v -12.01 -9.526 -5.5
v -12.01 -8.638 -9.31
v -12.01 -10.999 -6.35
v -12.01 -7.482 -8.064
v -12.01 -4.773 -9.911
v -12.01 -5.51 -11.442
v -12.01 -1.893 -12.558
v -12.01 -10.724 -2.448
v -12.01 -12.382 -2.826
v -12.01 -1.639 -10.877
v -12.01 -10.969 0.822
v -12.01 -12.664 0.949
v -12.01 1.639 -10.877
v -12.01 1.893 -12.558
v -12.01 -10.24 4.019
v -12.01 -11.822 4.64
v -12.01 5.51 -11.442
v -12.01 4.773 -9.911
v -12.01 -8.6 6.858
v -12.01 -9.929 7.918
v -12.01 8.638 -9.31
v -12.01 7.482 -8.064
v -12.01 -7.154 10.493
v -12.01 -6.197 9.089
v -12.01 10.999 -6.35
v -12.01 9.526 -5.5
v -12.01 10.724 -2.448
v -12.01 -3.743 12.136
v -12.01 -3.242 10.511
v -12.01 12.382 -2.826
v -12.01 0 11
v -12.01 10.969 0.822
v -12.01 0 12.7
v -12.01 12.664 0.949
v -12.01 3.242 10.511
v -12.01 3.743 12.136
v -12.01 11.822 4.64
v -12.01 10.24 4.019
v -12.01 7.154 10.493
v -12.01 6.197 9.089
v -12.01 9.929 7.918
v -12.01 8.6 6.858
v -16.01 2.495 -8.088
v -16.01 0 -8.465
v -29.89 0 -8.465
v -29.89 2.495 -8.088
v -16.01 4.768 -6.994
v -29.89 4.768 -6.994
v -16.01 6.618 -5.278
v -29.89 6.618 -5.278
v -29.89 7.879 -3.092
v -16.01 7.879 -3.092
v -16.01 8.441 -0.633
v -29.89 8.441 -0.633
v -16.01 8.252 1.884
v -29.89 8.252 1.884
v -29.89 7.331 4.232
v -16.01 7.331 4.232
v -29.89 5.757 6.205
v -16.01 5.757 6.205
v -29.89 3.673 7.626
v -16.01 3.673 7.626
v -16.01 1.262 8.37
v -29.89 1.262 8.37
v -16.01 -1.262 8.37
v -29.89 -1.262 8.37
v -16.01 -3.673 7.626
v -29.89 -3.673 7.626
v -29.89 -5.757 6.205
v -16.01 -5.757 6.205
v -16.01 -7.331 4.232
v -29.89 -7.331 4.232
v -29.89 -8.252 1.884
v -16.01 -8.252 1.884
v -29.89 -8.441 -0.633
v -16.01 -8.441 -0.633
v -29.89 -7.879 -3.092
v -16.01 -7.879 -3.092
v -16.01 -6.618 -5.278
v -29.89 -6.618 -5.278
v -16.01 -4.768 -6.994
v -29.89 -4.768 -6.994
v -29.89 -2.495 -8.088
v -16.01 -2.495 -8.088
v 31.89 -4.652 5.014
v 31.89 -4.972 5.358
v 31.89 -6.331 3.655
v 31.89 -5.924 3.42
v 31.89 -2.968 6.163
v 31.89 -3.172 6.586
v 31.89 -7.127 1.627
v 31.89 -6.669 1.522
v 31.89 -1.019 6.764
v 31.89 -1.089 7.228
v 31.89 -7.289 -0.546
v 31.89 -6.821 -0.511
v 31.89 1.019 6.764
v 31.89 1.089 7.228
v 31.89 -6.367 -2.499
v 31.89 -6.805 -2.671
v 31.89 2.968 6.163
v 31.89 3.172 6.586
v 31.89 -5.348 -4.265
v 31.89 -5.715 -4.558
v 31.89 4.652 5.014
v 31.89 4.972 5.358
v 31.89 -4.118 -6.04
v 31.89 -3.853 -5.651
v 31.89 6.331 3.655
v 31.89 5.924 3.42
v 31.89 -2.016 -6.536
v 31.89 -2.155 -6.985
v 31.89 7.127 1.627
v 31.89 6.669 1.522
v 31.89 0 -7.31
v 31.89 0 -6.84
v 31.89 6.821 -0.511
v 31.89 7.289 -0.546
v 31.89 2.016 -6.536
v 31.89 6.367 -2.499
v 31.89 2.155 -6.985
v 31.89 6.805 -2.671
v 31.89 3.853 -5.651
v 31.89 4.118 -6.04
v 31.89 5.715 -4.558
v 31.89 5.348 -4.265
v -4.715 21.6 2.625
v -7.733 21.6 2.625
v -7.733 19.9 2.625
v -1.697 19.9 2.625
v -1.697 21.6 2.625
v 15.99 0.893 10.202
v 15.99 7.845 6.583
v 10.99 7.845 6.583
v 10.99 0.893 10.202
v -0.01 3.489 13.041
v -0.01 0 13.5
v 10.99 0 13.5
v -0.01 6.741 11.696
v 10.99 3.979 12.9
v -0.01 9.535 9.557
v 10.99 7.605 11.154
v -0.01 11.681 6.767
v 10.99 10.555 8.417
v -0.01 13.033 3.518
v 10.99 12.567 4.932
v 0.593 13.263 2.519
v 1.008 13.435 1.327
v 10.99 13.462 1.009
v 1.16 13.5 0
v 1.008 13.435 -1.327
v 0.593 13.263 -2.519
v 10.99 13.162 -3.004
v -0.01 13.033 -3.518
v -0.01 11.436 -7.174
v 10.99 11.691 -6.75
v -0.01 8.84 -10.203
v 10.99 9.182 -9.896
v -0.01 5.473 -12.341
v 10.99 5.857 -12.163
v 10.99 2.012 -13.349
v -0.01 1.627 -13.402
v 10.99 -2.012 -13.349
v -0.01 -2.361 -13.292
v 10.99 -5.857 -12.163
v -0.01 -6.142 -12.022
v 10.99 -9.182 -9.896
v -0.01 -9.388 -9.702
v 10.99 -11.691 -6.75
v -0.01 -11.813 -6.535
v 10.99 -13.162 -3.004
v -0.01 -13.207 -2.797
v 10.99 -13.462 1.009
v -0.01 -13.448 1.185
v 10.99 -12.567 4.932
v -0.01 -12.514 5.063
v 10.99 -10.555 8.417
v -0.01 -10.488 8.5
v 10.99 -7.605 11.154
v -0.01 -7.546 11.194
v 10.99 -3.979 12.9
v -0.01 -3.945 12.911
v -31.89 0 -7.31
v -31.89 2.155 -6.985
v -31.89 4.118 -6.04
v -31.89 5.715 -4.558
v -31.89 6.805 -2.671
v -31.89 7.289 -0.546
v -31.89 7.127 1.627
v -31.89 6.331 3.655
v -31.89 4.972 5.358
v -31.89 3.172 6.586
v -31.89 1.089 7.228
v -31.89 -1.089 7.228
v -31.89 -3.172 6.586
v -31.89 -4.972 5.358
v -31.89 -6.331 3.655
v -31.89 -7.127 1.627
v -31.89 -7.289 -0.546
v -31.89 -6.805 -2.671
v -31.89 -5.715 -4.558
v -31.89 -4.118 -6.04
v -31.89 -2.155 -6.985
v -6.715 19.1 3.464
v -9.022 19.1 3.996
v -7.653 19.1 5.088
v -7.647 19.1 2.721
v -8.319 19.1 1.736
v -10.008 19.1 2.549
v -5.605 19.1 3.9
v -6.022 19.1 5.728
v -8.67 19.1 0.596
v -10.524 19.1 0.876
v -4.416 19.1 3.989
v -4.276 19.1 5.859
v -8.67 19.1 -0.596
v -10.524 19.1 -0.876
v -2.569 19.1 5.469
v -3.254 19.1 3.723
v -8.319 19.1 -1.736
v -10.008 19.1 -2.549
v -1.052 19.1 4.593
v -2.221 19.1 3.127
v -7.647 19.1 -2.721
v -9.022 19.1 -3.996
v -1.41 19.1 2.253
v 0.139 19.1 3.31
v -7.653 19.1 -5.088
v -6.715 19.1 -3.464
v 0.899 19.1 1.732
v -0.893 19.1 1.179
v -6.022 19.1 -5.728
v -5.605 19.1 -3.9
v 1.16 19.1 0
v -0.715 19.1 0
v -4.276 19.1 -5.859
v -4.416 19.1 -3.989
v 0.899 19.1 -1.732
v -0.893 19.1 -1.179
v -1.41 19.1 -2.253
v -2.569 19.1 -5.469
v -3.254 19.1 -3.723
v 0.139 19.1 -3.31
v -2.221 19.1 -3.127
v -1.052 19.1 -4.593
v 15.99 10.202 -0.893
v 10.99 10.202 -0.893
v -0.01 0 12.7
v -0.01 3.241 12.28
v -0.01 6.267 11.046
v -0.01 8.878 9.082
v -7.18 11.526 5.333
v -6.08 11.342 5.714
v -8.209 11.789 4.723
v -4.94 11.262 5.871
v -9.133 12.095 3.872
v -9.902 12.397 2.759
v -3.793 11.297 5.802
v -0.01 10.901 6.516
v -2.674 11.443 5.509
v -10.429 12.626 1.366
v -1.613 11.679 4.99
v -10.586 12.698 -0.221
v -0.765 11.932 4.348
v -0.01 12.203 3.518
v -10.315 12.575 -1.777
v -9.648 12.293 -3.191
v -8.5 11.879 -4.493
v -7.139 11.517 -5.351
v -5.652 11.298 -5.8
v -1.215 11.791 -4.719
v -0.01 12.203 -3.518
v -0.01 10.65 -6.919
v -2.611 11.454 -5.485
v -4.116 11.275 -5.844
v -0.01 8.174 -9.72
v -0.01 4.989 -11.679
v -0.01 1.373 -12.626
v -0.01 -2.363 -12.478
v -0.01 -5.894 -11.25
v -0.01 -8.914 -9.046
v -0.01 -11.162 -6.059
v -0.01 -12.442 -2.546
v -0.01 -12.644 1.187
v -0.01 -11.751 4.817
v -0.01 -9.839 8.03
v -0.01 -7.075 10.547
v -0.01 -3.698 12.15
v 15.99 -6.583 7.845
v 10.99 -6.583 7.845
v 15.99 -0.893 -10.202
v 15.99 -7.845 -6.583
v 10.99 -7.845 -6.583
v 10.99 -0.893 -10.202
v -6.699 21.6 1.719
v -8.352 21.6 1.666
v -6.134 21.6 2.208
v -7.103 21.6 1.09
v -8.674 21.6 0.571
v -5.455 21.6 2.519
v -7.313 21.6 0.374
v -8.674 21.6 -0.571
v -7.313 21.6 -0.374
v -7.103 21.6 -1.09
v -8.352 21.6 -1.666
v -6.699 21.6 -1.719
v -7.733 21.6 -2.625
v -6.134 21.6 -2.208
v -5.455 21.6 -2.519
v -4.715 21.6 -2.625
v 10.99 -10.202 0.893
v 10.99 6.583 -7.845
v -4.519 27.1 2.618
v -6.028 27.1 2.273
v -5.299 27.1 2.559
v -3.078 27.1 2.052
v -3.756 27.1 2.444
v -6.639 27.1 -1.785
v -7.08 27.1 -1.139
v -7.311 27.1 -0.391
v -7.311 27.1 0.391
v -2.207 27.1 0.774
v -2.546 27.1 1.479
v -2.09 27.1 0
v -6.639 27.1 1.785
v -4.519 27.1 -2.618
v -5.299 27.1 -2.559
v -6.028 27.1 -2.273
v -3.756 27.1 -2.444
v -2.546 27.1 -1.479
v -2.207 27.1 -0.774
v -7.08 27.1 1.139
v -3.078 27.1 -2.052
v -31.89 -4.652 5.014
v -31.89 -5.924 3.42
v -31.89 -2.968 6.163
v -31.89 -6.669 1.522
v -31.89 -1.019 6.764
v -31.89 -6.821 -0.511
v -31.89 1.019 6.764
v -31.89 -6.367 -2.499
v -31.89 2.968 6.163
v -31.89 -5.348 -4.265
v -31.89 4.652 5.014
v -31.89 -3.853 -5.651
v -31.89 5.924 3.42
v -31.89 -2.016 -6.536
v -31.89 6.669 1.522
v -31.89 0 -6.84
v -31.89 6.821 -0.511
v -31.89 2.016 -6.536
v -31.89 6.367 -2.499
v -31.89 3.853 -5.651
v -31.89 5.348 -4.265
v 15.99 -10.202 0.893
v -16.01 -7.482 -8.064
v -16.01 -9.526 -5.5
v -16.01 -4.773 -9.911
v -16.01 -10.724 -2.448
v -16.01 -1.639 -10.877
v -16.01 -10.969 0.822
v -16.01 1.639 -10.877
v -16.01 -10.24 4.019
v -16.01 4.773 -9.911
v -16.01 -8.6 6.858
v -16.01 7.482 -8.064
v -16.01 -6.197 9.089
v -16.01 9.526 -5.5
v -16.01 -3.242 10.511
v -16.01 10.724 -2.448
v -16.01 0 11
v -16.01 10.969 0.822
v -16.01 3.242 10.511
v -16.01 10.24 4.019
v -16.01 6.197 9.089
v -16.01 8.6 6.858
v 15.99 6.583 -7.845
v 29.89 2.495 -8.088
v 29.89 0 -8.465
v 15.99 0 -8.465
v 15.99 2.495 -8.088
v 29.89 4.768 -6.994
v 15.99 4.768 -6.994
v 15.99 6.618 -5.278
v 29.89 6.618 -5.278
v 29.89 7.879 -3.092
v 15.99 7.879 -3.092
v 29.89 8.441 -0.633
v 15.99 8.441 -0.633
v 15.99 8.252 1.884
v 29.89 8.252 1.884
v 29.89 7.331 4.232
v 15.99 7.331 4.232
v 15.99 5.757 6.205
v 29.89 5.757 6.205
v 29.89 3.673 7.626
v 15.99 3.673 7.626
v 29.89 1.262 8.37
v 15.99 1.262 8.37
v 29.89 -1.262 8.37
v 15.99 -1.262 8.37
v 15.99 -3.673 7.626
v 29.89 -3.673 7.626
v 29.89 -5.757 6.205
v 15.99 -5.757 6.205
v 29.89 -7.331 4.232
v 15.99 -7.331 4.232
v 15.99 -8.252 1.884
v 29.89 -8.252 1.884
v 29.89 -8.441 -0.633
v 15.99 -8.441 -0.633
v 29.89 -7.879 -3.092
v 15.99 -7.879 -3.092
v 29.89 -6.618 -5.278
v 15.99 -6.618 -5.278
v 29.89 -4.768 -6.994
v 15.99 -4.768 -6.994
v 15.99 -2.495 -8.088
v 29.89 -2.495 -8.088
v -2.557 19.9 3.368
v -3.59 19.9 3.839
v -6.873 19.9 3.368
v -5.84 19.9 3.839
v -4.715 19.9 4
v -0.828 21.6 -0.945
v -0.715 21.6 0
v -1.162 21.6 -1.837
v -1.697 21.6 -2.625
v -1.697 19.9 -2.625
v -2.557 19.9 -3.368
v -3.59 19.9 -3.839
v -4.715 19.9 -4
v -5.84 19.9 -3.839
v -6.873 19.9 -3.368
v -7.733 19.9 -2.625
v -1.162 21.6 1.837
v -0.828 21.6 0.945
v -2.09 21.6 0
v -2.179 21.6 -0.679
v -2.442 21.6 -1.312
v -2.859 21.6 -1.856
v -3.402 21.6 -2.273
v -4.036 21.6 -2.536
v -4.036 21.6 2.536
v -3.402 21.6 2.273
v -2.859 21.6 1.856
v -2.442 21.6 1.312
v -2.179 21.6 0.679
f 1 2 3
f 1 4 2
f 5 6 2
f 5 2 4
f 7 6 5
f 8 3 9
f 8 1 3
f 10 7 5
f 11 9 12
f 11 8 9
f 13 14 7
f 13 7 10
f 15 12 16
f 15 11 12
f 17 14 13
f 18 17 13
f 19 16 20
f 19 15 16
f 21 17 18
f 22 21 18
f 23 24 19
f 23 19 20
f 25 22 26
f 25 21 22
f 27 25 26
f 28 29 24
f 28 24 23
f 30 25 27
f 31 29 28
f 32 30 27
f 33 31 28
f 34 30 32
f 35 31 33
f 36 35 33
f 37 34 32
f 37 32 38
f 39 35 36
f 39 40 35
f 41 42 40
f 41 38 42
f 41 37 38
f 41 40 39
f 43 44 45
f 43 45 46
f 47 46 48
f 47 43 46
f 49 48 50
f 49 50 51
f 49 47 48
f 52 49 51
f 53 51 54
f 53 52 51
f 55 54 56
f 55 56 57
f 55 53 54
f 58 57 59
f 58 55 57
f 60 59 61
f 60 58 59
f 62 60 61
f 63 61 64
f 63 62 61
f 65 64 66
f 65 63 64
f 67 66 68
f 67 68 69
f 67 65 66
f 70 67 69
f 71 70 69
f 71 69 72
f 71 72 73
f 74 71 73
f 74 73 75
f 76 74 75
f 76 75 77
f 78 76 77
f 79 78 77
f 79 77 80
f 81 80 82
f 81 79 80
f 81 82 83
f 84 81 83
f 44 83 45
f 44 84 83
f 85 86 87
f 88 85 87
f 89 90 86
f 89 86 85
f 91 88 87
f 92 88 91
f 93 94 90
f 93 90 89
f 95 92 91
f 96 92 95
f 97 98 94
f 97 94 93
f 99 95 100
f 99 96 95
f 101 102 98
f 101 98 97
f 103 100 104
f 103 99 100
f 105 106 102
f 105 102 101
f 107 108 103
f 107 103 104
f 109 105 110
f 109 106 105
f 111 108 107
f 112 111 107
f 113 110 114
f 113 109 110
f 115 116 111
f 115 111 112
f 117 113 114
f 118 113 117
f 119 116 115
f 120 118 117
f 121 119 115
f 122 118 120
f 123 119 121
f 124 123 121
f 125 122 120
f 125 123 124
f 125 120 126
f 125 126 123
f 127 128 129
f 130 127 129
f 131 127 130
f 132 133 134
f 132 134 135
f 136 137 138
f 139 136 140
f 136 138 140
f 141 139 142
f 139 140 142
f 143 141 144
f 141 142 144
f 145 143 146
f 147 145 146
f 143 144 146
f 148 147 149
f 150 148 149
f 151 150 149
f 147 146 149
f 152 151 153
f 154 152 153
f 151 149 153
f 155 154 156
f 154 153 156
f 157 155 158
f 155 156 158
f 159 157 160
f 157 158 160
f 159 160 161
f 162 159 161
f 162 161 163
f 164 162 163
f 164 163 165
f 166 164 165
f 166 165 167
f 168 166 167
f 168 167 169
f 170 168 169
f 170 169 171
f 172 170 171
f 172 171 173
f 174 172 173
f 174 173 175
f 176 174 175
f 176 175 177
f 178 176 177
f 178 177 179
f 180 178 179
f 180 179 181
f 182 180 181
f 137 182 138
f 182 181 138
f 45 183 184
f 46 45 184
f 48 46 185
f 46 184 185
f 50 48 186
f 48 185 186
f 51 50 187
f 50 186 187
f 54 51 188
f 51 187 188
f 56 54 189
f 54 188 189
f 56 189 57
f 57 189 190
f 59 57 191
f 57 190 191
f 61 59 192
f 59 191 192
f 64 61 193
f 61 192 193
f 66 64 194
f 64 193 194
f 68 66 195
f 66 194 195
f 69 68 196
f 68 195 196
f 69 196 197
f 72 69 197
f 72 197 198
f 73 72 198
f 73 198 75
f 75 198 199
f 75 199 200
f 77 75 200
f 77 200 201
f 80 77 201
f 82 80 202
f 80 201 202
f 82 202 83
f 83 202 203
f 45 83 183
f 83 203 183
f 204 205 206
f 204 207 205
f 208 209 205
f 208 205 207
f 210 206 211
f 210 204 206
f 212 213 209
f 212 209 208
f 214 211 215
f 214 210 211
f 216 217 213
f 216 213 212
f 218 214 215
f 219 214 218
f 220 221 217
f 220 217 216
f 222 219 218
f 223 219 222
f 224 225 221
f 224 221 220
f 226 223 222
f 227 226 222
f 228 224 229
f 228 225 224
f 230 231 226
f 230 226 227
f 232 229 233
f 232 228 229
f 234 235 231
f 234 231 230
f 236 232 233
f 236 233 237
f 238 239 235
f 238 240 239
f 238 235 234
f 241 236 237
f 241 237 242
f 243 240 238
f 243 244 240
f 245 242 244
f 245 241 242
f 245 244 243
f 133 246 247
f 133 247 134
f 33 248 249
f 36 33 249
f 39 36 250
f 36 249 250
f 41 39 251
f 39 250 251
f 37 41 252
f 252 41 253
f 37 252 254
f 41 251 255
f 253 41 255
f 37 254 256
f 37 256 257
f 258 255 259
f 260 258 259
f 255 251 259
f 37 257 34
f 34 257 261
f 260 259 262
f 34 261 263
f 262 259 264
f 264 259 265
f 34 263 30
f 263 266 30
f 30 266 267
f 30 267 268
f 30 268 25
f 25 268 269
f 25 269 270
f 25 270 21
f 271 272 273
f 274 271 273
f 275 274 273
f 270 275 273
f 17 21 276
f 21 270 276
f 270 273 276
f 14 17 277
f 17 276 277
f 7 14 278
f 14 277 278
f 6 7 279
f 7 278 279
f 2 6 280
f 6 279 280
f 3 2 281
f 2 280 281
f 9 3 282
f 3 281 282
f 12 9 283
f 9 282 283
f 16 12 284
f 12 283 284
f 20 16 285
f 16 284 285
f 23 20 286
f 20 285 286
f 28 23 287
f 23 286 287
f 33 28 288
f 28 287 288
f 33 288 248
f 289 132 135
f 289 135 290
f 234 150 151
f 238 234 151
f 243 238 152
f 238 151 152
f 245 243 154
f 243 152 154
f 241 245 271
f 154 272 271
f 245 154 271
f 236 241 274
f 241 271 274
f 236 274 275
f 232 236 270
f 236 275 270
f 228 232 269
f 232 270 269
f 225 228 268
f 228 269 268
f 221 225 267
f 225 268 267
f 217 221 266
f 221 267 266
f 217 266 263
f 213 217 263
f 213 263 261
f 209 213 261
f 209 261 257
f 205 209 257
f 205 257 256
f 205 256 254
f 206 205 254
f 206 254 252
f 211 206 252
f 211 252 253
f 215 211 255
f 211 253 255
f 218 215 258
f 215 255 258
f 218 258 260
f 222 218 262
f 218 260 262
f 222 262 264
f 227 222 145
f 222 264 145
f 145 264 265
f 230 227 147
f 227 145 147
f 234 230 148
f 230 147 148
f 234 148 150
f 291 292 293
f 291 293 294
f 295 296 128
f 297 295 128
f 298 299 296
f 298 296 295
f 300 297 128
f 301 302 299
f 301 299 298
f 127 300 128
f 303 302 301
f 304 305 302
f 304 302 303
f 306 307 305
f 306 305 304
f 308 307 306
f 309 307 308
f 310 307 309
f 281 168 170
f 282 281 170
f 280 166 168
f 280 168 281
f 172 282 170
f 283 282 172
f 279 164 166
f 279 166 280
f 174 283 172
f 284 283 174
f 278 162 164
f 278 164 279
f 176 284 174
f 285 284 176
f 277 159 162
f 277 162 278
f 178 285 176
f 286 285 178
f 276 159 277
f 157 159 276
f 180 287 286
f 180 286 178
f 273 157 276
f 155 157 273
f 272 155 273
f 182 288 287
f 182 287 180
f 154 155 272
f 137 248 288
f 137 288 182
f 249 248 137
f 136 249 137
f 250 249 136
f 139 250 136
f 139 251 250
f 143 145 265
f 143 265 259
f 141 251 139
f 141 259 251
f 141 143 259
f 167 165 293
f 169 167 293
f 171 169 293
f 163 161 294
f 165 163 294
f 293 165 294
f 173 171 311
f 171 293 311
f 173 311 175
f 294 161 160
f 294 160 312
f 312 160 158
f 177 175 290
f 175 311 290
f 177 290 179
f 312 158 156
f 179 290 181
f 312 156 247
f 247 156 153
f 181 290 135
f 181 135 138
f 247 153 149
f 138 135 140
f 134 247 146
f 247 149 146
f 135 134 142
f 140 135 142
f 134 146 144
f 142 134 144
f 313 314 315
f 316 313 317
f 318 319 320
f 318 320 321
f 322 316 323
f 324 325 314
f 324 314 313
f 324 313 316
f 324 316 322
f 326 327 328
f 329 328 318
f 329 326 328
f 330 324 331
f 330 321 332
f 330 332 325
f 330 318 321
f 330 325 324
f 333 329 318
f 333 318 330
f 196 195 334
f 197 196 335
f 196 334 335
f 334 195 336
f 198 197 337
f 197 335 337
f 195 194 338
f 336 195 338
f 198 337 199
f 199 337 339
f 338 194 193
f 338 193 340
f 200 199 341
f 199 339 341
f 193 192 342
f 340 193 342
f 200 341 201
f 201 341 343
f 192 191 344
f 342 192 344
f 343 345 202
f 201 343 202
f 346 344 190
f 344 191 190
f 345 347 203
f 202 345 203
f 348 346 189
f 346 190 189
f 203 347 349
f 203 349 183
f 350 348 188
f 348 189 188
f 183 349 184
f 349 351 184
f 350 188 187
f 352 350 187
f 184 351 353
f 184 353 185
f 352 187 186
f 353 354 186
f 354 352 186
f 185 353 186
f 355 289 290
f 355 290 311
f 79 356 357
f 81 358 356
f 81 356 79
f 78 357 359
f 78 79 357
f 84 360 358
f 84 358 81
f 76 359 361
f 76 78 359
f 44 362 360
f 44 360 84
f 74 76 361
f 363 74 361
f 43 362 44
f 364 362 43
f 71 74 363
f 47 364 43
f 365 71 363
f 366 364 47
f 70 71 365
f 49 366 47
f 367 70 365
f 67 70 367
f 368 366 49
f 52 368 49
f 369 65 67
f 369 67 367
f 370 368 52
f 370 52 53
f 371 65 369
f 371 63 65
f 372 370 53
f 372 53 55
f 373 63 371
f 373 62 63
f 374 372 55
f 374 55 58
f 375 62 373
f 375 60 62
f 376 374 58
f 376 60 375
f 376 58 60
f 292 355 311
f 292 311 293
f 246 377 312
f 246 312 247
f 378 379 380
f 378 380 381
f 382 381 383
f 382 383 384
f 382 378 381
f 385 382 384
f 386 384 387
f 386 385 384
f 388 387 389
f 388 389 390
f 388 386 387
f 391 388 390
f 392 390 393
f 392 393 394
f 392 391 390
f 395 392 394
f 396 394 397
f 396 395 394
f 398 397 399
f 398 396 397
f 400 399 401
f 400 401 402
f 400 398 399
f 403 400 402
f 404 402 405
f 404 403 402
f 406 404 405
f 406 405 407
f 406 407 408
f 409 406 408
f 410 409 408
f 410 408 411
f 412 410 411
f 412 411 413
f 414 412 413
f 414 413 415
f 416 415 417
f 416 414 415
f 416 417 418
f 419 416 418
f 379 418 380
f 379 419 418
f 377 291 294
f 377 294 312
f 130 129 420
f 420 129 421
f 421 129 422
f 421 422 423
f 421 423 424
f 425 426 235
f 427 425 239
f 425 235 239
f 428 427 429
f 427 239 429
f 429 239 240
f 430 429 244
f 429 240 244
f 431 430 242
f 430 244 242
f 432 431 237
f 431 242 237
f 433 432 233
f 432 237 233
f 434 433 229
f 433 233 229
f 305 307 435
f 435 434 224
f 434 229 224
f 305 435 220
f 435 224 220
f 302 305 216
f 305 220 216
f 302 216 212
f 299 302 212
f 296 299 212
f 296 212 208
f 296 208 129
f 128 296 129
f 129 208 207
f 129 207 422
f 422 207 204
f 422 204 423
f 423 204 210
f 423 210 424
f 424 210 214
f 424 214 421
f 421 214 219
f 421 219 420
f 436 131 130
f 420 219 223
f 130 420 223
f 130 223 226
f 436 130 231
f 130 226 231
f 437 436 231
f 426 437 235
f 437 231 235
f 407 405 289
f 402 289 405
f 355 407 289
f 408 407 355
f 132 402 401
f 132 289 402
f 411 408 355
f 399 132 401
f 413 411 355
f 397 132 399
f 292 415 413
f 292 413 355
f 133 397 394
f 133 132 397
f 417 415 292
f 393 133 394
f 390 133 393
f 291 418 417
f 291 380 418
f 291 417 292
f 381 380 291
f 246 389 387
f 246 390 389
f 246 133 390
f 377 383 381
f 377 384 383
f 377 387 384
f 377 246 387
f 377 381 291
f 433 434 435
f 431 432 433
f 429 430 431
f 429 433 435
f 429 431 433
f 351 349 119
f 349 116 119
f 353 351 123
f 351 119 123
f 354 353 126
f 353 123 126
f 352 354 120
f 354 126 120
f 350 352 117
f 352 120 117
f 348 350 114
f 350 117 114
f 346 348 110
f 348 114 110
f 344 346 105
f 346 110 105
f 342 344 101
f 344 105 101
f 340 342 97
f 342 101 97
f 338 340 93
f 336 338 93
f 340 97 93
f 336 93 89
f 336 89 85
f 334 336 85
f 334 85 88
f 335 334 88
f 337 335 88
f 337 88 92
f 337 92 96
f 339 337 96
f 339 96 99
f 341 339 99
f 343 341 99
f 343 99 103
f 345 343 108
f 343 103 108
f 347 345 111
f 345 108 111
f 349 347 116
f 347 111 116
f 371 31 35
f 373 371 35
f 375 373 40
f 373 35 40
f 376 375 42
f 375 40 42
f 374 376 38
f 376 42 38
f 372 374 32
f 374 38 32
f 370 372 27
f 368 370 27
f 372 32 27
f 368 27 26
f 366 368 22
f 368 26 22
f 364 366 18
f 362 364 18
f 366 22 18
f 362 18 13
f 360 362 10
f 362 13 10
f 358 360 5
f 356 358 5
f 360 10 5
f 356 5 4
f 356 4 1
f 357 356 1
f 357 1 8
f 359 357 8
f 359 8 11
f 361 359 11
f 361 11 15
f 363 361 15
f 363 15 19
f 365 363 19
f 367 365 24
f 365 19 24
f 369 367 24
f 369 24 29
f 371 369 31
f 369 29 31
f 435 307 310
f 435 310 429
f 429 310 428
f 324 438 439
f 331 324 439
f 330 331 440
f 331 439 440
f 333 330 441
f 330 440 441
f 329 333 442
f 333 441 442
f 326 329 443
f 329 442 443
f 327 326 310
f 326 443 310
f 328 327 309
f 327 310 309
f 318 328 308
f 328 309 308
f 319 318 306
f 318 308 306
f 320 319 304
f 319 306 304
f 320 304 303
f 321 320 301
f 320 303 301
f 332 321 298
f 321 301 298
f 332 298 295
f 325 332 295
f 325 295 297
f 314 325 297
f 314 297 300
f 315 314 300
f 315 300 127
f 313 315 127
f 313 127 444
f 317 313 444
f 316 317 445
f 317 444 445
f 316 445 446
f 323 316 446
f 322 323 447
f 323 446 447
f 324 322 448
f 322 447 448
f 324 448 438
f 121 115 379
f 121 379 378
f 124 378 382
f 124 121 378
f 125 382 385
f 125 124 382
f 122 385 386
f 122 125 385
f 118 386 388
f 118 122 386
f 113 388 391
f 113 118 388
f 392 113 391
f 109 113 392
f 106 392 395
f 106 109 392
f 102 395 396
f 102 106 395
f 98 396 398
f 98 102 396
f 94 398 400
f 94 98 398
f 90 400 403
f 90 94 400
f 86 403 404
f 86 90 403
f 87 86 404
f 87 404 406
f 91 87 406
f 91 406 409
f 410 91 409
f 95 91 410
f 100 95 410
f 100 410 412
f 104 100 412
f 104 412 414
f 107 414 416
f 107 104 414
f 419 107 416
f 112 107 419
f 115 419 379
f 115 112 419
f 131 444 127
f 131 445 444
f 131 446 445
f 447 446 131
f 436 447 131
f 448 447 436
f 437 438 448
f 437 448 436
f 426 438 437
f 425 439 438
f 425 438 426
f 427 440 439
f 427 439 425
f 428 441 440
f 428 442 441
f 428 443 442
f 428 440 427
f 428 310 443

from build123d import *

# Parameters (mm, degrees)
SKETCH1_R               = 8.46455
BOSS_EXTRUDE1_DEPTH     = 31.89
BOSS_EXTRUDE3_DEPTH     = 5
SKETCH6_R               = 13.5
BOSS_EXTRUDE4_DEPTH     = 11
SKETCH7_R               = 12.7
BOSS_EXTRUDE5_DEPTH     = 12
SKETCH8_R               = 11
BOSS_EXTRUDE6_DEPTH     = 4
SKETCH9_R               = 5.875
BOSS_EXTRUDE7_DEPTH     = 19.1
SKETCH10_R              = 4
BOSS_EXTRUDE8_DEPTH     = 2.5
SKETCH11_OUTSIDE_W      = 81.31
SKETCH11_OUTSIDE_H      = 44.53
SKETCH11_OUTSIDE_W_2    = 14.822508056
SKETCH11_OUTSIDE_H_2    = 5.25
CUT_EXTRUDE4_DEPTH      = 1.7
SKETCH12_R              = 2.625
BOSS_EXTRUDE9_DEPTH     = 5.5
SKETCH2_R               = 6.84
CUT_EXTRUDE3_DEPTH      = 32.89
CUT_EXTRUDE3_DEPTH_BACK = 32.89
CHAMFER1_SIZE           = 2
CHAMFER1_SIZE2          = 1.154700538
CHAMFER1_PART_2_SIZE    = 2
CHAMFER1_PART_2_SIZE2   = 1.154700538


with BuildPart() as part:
    # Sketch1 → Boss-Extrude1 (new body, symmetric)
    with BuildSketch(Plane(origin=(0, 0, 0), x_dir=(0, 0, -1), z_dir=(1, 0, 0))):
        Circle(SKETCH1_R)
    extrude(amount=BOSS_EXTRUDE1_DEPTH, both=True)

    # Sketch5 → Boss-Extrude3 (add)
    with BuildSketch(Plane(origin=(15.99, 0, 0), x_dir=(0, 0, -1), z_dir=(1, 0, 0))):
        Polygon((7.845102358, 6.582822495), (0.892566651, 10.202083501), (-6.582822495, 7.845102358), (-10.202083501, 0.892566651), (-7.845102358, -6.582822495), (-0.892566651, -10.202083501), (6.582822495, -7.845102358), (10.202083501, -0.892566651), align=None)
    extrude(amount=-BOSS_EXTRUDE3_DEPTH)

    # Sketch6 → Boss-Extrude4 (add)
    with BuildSketch(Plane.ZY.offset(-10.99)):
        Circle(SKETCH6_R)
    extrude(amount=BOSS_EXTRUDE4_DEPTH)

    # Sketch7 → Boss-Extrude5 (add)
    with BuildSketch(Plane.ZY.offset(0.01)):
        Circle(SKETCH7_R)
    extrude(amount=BOSS_EXTRUDE5_DEPTH)

    # Sketch8 → Boss-Extrude6 (add)
    with BuildSketch(Plane.ZY.offset(12.01)):
        Circle(SKETCH8_R)
    extrude(amount=BOSS_EXTRUDE6_DEPTH)

    # Sketch9 → Boss-Extrude7 (add)
    with BuildSketch(Plane(origin=(0, 0, 0), x_dir=(1, 0, 0), z_dir=(0, 1, 0))):
        with Locations((-4.715, 0)):
            Circle(SKETCH9_R)
    extrude(amount=BOSS_EXTRUDE7_DEPTH)

    # Sketch10 → Boss-Extrude8 (add)
    with BuildSketch(Plane(origin=(0, 19.1, 0), x_dir=(1, 0, 0), z_dir=(0, 1, 0))):
        with Locations((-4.715, 0)):
            Circle(SKETCH10_R)
    extrude(amount=BOSS_EXTRUDE8_DEPTH)

    # Sketch11 outside → Cut-Extrude4 (cut)
    with BuildSketch(Plane(origin=(0, 21.6, 0), x_dir=(1, 0, 0), z_dir=(0, 1, 0))):
        Rectangle(SKETCH11_OUTSIDE_W, SKETCH11_OUTSIDE_H)
        with Locations((-4.715, 0)):
            Rectangle(SKETCH11_OUTSIDE_W_2, SKETCH11_OUTSIDE_H_2, mode=Mode.SUBTRACT)
    extrude(amount=-CUT_EXTRUDE4_DEPTH, mode=Mode.SUBTRACT)

    # Sketch12 → Boss-Extrude9 (add)
    with BuildSketch(Plane(origin=(0, 21.6, 0), x_dir=(1, 0, 0), z_dir=(0, 1, 0))):
        with Locations((-4.715, 0)):
            Circle(SKETCH12_R)
    extrude(amount=BOSS_EXTRUDE9_DEPTH)

    # Sketch2 → Cut-Extrude3 (cut, two sides)
    with BuildSketch(Plane(origin=(0, 0, 0), x_dir=(0, 0, -1), z_dir=(1, 0, 0))) as cut_extrude3_sk:
        Circle(SKETCH2_R)
    extrude(amount=CUT_EXTRUDE3_DEPTH, mode=Mode.SUBTRACT)
    extrude(cut_extrude3_sk.sketch, amount=-CUT_EXTRUDE3_DEPTH_BACK, mode=Mode.SUBTRACT)

    # Chamfer1
    chamfer1_edges = [part.edges().sort_by_distance(p)[0] for p in [
        (-31.89, 0, 8.46455),
    ]]
    chamfer1_side = [part.faces().sort_by_distance(p)[0] for p in [
        (-23.95, 0, 8.46455),
    ]]
    chamfer(chamfer1_edges, length=CHAMFER1_SIZE, length2=CHAMFER1_SIZE2, reference=chamfer1_side[0])

    # Chamfer1 part 2
    chamfer1_part_2_edges = [part.edges().sort_by_distance(p)[0] for p in [
        (31.89, 0, 8.46455),
    ]]
    chamfer1_part_2_side = [part.faces().sort_by_distance(p)[0] for p in [
        (23.94, 0, 8.46455),
    ]]
    chamfer(chamfer1_part_2_edges, length=CHAMFER1_PART_2_SIZE, length2=CHAMFER1_PART_2_SIZE2, reference=chamfer1_part_2_side[0])


solid = part.part
